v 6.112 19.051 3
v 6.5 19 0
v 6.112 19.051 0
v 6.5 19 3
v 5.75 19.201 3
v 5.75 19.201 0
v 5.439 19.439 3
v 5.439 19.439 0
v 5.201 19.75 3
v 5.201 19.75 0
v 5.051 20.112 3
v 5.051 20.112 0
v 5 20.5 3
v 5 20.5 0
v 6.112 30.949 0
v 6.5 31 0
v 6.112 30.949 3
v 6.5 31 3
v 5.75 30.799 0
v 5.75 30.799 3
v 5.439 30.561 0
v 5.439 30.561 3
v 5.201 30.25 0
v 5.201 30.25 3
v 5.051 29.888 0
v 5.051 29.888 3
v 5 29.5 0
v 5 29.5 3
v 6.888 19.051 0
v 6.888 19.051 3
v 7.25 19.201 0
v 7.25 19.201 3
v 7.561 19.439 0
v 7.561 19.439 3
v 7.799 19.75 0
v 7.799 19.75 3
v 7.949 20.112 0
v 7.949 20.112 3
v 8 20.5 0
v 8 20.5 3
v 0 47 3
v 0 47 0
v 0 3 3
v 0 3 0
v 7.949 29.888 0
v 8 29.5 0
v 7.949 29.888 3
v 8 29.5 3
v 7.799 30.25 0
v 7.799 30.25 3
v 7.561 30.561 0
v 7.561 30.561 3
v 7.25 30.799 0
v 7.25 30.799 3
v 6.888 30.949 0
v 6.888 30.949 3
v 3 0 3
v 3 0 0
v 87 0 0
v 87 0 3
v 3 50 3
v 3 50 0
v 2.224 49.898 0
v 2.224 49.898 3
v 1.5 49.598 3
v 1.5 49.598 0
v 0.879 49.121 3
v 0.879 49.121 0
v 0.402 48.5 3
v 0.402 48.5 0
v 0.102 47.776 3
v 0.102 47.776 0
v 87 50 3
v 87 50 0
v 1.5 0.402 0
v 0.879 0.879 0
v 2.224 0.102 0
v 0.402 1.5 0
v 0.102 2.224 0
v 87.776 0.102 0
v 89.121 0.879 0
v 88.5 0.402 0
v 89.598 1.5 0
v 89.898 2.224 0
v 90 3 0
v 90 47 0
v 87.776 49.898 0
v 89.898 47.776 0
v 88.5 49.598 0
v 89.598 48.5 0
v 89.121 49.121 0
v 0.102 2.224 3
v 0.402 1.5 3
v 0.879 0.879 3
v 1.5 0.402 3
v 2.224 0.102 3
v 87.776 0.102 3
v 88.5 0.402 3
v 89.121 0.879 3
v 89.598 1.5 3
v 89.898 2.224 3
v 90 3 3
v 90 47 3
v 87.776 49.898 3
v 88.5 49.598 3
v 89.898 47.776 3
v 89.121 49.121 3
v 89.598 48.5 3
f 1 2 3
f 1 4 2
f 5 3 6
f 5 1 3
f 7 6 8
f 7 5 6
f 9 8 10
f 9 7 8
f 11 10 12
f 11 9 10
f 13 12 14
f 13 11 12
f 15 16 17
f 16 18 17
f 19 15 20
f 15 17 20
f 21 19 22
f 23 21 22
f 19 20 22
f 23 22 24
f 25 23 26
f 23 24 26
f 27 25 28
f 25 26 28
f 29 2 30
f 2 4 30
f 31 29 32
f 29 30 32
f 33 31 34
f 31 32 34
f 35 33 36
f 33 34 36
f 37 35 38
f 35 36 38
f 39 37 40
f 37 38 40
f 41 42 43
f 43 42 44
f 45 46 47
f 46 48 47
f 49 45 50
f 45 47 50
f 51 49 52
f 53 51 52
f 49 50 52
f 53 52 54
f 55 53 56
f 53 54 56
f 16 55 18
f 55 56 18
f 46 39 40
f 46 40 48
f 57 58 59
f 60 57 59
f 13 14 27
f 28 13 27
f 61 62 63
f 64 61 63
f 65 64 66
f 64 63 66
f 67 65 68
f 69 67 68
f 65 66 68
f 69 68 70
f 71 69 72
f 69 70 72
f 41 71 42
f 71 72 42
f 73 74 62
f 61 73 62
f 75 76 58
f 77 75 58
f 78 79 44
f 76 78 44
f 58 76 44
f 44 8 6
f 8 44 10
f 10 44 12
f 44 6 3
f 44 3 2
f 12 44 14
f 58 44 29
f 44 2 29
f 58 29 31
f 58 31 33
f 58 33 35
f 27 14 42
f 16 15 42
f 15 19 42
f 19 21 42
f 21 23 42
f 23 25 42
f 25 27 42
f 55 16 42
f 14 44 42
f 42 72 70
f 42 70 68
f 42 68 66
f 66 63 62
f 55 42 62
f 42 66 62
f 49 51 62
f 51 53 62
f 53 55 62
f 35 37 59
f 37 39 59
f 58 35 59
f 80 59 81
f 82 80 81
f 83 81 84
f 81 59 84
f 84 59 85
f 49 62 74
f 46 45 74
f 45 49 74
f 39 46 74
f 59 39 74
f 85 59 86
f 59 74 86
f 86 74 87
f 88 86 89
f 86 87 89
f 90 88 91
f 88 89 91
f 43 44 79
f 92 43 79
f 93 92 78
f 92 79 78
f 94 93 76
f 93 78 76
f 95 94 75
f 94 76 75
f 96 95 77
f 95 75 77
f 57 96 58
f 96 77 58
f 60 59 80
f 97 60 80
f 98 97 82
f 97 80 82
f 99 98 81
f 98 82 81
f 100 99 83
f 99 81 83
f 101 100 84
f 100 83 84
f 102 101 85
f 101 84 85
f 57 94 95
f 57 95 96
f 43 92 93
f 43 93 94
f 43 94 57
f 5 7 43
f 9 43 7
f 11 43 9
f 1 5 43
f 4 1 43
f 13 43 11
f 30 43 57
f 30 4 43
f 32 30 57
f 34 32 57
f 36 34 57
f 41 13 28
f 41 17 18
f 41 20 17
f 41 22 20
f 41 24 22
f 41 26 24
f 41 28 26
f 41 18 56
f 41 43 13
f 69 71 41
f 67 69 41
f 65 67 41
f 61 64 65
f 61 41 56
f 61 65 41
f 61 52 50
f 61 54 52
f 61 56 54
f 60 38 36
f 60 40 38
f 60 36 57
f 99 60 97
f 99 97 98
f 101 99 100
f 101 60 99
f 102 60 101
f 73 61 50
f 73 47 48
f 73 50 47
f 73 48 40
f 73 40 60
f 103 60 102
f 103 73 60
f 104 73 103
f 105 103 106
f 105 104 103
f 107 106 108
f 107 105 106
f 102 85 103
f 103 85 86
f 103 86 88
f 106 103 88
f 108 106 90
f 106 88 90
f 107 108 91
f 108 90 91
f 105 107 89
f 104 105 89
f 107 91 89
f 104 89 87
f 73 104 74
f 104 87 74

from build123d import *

# Parameters (mm, degrees)
F0_W     = 3
F0_H     = 12
F1_DEPTH = 3
F2_R     = 1.49999


# Not quite as in the source:
# - a fillet or chamfer is up to 0.001 mm smaller than in the source, because OpenCascade refuses the exact size
# - a feature of the source that left no trace in its solid (it failed there, or was rolled back) is left out


with BuildPart() as f1:
    # F0 (on Top) → F1 (new body)
    with BuildSketch(Plane.XY):
        with BuildLine():
            ThreePointArc((0, 3), (0.8786796564, 0.8786796564), (3, 0))
            Line((3, 0), (87, 0))
            ThreePointArc((87, 0), (89.1213203436, 0.8786796564), (90, 3))
            Line((90, 3), (90, 47))
            ThreePointArc((90, 47), (89.1213203436, 49.1213203436), (87, 50))
            Line((87, 50), (3, 50))
            ThreePointArc((3, 50), (0.8786796564, 49.1213203436), (0, 47))
            Line((0, 47), (0, 3))
        make_face()
        with Locations((6.5, 25)):
            Rectangle(F0_W, F0_H, mode=Mode.SUBTRACT)
    extrude(amount=F1_DEPTH)

    # F2 (radius 1.5 in the source; OpenCascade refuses exactly that, so slightly less here)
    f2_edges = [f1.edges().sort_by_distance(p)[0] for p in [
        (5, 31, 1.5),
        (8, 31, 1.5),
        (5, 19, 1.5),
        (8, 19, 1.5),
    ]]
    fillet(f2_edges, radius=F2_R)


solid = f1.part
